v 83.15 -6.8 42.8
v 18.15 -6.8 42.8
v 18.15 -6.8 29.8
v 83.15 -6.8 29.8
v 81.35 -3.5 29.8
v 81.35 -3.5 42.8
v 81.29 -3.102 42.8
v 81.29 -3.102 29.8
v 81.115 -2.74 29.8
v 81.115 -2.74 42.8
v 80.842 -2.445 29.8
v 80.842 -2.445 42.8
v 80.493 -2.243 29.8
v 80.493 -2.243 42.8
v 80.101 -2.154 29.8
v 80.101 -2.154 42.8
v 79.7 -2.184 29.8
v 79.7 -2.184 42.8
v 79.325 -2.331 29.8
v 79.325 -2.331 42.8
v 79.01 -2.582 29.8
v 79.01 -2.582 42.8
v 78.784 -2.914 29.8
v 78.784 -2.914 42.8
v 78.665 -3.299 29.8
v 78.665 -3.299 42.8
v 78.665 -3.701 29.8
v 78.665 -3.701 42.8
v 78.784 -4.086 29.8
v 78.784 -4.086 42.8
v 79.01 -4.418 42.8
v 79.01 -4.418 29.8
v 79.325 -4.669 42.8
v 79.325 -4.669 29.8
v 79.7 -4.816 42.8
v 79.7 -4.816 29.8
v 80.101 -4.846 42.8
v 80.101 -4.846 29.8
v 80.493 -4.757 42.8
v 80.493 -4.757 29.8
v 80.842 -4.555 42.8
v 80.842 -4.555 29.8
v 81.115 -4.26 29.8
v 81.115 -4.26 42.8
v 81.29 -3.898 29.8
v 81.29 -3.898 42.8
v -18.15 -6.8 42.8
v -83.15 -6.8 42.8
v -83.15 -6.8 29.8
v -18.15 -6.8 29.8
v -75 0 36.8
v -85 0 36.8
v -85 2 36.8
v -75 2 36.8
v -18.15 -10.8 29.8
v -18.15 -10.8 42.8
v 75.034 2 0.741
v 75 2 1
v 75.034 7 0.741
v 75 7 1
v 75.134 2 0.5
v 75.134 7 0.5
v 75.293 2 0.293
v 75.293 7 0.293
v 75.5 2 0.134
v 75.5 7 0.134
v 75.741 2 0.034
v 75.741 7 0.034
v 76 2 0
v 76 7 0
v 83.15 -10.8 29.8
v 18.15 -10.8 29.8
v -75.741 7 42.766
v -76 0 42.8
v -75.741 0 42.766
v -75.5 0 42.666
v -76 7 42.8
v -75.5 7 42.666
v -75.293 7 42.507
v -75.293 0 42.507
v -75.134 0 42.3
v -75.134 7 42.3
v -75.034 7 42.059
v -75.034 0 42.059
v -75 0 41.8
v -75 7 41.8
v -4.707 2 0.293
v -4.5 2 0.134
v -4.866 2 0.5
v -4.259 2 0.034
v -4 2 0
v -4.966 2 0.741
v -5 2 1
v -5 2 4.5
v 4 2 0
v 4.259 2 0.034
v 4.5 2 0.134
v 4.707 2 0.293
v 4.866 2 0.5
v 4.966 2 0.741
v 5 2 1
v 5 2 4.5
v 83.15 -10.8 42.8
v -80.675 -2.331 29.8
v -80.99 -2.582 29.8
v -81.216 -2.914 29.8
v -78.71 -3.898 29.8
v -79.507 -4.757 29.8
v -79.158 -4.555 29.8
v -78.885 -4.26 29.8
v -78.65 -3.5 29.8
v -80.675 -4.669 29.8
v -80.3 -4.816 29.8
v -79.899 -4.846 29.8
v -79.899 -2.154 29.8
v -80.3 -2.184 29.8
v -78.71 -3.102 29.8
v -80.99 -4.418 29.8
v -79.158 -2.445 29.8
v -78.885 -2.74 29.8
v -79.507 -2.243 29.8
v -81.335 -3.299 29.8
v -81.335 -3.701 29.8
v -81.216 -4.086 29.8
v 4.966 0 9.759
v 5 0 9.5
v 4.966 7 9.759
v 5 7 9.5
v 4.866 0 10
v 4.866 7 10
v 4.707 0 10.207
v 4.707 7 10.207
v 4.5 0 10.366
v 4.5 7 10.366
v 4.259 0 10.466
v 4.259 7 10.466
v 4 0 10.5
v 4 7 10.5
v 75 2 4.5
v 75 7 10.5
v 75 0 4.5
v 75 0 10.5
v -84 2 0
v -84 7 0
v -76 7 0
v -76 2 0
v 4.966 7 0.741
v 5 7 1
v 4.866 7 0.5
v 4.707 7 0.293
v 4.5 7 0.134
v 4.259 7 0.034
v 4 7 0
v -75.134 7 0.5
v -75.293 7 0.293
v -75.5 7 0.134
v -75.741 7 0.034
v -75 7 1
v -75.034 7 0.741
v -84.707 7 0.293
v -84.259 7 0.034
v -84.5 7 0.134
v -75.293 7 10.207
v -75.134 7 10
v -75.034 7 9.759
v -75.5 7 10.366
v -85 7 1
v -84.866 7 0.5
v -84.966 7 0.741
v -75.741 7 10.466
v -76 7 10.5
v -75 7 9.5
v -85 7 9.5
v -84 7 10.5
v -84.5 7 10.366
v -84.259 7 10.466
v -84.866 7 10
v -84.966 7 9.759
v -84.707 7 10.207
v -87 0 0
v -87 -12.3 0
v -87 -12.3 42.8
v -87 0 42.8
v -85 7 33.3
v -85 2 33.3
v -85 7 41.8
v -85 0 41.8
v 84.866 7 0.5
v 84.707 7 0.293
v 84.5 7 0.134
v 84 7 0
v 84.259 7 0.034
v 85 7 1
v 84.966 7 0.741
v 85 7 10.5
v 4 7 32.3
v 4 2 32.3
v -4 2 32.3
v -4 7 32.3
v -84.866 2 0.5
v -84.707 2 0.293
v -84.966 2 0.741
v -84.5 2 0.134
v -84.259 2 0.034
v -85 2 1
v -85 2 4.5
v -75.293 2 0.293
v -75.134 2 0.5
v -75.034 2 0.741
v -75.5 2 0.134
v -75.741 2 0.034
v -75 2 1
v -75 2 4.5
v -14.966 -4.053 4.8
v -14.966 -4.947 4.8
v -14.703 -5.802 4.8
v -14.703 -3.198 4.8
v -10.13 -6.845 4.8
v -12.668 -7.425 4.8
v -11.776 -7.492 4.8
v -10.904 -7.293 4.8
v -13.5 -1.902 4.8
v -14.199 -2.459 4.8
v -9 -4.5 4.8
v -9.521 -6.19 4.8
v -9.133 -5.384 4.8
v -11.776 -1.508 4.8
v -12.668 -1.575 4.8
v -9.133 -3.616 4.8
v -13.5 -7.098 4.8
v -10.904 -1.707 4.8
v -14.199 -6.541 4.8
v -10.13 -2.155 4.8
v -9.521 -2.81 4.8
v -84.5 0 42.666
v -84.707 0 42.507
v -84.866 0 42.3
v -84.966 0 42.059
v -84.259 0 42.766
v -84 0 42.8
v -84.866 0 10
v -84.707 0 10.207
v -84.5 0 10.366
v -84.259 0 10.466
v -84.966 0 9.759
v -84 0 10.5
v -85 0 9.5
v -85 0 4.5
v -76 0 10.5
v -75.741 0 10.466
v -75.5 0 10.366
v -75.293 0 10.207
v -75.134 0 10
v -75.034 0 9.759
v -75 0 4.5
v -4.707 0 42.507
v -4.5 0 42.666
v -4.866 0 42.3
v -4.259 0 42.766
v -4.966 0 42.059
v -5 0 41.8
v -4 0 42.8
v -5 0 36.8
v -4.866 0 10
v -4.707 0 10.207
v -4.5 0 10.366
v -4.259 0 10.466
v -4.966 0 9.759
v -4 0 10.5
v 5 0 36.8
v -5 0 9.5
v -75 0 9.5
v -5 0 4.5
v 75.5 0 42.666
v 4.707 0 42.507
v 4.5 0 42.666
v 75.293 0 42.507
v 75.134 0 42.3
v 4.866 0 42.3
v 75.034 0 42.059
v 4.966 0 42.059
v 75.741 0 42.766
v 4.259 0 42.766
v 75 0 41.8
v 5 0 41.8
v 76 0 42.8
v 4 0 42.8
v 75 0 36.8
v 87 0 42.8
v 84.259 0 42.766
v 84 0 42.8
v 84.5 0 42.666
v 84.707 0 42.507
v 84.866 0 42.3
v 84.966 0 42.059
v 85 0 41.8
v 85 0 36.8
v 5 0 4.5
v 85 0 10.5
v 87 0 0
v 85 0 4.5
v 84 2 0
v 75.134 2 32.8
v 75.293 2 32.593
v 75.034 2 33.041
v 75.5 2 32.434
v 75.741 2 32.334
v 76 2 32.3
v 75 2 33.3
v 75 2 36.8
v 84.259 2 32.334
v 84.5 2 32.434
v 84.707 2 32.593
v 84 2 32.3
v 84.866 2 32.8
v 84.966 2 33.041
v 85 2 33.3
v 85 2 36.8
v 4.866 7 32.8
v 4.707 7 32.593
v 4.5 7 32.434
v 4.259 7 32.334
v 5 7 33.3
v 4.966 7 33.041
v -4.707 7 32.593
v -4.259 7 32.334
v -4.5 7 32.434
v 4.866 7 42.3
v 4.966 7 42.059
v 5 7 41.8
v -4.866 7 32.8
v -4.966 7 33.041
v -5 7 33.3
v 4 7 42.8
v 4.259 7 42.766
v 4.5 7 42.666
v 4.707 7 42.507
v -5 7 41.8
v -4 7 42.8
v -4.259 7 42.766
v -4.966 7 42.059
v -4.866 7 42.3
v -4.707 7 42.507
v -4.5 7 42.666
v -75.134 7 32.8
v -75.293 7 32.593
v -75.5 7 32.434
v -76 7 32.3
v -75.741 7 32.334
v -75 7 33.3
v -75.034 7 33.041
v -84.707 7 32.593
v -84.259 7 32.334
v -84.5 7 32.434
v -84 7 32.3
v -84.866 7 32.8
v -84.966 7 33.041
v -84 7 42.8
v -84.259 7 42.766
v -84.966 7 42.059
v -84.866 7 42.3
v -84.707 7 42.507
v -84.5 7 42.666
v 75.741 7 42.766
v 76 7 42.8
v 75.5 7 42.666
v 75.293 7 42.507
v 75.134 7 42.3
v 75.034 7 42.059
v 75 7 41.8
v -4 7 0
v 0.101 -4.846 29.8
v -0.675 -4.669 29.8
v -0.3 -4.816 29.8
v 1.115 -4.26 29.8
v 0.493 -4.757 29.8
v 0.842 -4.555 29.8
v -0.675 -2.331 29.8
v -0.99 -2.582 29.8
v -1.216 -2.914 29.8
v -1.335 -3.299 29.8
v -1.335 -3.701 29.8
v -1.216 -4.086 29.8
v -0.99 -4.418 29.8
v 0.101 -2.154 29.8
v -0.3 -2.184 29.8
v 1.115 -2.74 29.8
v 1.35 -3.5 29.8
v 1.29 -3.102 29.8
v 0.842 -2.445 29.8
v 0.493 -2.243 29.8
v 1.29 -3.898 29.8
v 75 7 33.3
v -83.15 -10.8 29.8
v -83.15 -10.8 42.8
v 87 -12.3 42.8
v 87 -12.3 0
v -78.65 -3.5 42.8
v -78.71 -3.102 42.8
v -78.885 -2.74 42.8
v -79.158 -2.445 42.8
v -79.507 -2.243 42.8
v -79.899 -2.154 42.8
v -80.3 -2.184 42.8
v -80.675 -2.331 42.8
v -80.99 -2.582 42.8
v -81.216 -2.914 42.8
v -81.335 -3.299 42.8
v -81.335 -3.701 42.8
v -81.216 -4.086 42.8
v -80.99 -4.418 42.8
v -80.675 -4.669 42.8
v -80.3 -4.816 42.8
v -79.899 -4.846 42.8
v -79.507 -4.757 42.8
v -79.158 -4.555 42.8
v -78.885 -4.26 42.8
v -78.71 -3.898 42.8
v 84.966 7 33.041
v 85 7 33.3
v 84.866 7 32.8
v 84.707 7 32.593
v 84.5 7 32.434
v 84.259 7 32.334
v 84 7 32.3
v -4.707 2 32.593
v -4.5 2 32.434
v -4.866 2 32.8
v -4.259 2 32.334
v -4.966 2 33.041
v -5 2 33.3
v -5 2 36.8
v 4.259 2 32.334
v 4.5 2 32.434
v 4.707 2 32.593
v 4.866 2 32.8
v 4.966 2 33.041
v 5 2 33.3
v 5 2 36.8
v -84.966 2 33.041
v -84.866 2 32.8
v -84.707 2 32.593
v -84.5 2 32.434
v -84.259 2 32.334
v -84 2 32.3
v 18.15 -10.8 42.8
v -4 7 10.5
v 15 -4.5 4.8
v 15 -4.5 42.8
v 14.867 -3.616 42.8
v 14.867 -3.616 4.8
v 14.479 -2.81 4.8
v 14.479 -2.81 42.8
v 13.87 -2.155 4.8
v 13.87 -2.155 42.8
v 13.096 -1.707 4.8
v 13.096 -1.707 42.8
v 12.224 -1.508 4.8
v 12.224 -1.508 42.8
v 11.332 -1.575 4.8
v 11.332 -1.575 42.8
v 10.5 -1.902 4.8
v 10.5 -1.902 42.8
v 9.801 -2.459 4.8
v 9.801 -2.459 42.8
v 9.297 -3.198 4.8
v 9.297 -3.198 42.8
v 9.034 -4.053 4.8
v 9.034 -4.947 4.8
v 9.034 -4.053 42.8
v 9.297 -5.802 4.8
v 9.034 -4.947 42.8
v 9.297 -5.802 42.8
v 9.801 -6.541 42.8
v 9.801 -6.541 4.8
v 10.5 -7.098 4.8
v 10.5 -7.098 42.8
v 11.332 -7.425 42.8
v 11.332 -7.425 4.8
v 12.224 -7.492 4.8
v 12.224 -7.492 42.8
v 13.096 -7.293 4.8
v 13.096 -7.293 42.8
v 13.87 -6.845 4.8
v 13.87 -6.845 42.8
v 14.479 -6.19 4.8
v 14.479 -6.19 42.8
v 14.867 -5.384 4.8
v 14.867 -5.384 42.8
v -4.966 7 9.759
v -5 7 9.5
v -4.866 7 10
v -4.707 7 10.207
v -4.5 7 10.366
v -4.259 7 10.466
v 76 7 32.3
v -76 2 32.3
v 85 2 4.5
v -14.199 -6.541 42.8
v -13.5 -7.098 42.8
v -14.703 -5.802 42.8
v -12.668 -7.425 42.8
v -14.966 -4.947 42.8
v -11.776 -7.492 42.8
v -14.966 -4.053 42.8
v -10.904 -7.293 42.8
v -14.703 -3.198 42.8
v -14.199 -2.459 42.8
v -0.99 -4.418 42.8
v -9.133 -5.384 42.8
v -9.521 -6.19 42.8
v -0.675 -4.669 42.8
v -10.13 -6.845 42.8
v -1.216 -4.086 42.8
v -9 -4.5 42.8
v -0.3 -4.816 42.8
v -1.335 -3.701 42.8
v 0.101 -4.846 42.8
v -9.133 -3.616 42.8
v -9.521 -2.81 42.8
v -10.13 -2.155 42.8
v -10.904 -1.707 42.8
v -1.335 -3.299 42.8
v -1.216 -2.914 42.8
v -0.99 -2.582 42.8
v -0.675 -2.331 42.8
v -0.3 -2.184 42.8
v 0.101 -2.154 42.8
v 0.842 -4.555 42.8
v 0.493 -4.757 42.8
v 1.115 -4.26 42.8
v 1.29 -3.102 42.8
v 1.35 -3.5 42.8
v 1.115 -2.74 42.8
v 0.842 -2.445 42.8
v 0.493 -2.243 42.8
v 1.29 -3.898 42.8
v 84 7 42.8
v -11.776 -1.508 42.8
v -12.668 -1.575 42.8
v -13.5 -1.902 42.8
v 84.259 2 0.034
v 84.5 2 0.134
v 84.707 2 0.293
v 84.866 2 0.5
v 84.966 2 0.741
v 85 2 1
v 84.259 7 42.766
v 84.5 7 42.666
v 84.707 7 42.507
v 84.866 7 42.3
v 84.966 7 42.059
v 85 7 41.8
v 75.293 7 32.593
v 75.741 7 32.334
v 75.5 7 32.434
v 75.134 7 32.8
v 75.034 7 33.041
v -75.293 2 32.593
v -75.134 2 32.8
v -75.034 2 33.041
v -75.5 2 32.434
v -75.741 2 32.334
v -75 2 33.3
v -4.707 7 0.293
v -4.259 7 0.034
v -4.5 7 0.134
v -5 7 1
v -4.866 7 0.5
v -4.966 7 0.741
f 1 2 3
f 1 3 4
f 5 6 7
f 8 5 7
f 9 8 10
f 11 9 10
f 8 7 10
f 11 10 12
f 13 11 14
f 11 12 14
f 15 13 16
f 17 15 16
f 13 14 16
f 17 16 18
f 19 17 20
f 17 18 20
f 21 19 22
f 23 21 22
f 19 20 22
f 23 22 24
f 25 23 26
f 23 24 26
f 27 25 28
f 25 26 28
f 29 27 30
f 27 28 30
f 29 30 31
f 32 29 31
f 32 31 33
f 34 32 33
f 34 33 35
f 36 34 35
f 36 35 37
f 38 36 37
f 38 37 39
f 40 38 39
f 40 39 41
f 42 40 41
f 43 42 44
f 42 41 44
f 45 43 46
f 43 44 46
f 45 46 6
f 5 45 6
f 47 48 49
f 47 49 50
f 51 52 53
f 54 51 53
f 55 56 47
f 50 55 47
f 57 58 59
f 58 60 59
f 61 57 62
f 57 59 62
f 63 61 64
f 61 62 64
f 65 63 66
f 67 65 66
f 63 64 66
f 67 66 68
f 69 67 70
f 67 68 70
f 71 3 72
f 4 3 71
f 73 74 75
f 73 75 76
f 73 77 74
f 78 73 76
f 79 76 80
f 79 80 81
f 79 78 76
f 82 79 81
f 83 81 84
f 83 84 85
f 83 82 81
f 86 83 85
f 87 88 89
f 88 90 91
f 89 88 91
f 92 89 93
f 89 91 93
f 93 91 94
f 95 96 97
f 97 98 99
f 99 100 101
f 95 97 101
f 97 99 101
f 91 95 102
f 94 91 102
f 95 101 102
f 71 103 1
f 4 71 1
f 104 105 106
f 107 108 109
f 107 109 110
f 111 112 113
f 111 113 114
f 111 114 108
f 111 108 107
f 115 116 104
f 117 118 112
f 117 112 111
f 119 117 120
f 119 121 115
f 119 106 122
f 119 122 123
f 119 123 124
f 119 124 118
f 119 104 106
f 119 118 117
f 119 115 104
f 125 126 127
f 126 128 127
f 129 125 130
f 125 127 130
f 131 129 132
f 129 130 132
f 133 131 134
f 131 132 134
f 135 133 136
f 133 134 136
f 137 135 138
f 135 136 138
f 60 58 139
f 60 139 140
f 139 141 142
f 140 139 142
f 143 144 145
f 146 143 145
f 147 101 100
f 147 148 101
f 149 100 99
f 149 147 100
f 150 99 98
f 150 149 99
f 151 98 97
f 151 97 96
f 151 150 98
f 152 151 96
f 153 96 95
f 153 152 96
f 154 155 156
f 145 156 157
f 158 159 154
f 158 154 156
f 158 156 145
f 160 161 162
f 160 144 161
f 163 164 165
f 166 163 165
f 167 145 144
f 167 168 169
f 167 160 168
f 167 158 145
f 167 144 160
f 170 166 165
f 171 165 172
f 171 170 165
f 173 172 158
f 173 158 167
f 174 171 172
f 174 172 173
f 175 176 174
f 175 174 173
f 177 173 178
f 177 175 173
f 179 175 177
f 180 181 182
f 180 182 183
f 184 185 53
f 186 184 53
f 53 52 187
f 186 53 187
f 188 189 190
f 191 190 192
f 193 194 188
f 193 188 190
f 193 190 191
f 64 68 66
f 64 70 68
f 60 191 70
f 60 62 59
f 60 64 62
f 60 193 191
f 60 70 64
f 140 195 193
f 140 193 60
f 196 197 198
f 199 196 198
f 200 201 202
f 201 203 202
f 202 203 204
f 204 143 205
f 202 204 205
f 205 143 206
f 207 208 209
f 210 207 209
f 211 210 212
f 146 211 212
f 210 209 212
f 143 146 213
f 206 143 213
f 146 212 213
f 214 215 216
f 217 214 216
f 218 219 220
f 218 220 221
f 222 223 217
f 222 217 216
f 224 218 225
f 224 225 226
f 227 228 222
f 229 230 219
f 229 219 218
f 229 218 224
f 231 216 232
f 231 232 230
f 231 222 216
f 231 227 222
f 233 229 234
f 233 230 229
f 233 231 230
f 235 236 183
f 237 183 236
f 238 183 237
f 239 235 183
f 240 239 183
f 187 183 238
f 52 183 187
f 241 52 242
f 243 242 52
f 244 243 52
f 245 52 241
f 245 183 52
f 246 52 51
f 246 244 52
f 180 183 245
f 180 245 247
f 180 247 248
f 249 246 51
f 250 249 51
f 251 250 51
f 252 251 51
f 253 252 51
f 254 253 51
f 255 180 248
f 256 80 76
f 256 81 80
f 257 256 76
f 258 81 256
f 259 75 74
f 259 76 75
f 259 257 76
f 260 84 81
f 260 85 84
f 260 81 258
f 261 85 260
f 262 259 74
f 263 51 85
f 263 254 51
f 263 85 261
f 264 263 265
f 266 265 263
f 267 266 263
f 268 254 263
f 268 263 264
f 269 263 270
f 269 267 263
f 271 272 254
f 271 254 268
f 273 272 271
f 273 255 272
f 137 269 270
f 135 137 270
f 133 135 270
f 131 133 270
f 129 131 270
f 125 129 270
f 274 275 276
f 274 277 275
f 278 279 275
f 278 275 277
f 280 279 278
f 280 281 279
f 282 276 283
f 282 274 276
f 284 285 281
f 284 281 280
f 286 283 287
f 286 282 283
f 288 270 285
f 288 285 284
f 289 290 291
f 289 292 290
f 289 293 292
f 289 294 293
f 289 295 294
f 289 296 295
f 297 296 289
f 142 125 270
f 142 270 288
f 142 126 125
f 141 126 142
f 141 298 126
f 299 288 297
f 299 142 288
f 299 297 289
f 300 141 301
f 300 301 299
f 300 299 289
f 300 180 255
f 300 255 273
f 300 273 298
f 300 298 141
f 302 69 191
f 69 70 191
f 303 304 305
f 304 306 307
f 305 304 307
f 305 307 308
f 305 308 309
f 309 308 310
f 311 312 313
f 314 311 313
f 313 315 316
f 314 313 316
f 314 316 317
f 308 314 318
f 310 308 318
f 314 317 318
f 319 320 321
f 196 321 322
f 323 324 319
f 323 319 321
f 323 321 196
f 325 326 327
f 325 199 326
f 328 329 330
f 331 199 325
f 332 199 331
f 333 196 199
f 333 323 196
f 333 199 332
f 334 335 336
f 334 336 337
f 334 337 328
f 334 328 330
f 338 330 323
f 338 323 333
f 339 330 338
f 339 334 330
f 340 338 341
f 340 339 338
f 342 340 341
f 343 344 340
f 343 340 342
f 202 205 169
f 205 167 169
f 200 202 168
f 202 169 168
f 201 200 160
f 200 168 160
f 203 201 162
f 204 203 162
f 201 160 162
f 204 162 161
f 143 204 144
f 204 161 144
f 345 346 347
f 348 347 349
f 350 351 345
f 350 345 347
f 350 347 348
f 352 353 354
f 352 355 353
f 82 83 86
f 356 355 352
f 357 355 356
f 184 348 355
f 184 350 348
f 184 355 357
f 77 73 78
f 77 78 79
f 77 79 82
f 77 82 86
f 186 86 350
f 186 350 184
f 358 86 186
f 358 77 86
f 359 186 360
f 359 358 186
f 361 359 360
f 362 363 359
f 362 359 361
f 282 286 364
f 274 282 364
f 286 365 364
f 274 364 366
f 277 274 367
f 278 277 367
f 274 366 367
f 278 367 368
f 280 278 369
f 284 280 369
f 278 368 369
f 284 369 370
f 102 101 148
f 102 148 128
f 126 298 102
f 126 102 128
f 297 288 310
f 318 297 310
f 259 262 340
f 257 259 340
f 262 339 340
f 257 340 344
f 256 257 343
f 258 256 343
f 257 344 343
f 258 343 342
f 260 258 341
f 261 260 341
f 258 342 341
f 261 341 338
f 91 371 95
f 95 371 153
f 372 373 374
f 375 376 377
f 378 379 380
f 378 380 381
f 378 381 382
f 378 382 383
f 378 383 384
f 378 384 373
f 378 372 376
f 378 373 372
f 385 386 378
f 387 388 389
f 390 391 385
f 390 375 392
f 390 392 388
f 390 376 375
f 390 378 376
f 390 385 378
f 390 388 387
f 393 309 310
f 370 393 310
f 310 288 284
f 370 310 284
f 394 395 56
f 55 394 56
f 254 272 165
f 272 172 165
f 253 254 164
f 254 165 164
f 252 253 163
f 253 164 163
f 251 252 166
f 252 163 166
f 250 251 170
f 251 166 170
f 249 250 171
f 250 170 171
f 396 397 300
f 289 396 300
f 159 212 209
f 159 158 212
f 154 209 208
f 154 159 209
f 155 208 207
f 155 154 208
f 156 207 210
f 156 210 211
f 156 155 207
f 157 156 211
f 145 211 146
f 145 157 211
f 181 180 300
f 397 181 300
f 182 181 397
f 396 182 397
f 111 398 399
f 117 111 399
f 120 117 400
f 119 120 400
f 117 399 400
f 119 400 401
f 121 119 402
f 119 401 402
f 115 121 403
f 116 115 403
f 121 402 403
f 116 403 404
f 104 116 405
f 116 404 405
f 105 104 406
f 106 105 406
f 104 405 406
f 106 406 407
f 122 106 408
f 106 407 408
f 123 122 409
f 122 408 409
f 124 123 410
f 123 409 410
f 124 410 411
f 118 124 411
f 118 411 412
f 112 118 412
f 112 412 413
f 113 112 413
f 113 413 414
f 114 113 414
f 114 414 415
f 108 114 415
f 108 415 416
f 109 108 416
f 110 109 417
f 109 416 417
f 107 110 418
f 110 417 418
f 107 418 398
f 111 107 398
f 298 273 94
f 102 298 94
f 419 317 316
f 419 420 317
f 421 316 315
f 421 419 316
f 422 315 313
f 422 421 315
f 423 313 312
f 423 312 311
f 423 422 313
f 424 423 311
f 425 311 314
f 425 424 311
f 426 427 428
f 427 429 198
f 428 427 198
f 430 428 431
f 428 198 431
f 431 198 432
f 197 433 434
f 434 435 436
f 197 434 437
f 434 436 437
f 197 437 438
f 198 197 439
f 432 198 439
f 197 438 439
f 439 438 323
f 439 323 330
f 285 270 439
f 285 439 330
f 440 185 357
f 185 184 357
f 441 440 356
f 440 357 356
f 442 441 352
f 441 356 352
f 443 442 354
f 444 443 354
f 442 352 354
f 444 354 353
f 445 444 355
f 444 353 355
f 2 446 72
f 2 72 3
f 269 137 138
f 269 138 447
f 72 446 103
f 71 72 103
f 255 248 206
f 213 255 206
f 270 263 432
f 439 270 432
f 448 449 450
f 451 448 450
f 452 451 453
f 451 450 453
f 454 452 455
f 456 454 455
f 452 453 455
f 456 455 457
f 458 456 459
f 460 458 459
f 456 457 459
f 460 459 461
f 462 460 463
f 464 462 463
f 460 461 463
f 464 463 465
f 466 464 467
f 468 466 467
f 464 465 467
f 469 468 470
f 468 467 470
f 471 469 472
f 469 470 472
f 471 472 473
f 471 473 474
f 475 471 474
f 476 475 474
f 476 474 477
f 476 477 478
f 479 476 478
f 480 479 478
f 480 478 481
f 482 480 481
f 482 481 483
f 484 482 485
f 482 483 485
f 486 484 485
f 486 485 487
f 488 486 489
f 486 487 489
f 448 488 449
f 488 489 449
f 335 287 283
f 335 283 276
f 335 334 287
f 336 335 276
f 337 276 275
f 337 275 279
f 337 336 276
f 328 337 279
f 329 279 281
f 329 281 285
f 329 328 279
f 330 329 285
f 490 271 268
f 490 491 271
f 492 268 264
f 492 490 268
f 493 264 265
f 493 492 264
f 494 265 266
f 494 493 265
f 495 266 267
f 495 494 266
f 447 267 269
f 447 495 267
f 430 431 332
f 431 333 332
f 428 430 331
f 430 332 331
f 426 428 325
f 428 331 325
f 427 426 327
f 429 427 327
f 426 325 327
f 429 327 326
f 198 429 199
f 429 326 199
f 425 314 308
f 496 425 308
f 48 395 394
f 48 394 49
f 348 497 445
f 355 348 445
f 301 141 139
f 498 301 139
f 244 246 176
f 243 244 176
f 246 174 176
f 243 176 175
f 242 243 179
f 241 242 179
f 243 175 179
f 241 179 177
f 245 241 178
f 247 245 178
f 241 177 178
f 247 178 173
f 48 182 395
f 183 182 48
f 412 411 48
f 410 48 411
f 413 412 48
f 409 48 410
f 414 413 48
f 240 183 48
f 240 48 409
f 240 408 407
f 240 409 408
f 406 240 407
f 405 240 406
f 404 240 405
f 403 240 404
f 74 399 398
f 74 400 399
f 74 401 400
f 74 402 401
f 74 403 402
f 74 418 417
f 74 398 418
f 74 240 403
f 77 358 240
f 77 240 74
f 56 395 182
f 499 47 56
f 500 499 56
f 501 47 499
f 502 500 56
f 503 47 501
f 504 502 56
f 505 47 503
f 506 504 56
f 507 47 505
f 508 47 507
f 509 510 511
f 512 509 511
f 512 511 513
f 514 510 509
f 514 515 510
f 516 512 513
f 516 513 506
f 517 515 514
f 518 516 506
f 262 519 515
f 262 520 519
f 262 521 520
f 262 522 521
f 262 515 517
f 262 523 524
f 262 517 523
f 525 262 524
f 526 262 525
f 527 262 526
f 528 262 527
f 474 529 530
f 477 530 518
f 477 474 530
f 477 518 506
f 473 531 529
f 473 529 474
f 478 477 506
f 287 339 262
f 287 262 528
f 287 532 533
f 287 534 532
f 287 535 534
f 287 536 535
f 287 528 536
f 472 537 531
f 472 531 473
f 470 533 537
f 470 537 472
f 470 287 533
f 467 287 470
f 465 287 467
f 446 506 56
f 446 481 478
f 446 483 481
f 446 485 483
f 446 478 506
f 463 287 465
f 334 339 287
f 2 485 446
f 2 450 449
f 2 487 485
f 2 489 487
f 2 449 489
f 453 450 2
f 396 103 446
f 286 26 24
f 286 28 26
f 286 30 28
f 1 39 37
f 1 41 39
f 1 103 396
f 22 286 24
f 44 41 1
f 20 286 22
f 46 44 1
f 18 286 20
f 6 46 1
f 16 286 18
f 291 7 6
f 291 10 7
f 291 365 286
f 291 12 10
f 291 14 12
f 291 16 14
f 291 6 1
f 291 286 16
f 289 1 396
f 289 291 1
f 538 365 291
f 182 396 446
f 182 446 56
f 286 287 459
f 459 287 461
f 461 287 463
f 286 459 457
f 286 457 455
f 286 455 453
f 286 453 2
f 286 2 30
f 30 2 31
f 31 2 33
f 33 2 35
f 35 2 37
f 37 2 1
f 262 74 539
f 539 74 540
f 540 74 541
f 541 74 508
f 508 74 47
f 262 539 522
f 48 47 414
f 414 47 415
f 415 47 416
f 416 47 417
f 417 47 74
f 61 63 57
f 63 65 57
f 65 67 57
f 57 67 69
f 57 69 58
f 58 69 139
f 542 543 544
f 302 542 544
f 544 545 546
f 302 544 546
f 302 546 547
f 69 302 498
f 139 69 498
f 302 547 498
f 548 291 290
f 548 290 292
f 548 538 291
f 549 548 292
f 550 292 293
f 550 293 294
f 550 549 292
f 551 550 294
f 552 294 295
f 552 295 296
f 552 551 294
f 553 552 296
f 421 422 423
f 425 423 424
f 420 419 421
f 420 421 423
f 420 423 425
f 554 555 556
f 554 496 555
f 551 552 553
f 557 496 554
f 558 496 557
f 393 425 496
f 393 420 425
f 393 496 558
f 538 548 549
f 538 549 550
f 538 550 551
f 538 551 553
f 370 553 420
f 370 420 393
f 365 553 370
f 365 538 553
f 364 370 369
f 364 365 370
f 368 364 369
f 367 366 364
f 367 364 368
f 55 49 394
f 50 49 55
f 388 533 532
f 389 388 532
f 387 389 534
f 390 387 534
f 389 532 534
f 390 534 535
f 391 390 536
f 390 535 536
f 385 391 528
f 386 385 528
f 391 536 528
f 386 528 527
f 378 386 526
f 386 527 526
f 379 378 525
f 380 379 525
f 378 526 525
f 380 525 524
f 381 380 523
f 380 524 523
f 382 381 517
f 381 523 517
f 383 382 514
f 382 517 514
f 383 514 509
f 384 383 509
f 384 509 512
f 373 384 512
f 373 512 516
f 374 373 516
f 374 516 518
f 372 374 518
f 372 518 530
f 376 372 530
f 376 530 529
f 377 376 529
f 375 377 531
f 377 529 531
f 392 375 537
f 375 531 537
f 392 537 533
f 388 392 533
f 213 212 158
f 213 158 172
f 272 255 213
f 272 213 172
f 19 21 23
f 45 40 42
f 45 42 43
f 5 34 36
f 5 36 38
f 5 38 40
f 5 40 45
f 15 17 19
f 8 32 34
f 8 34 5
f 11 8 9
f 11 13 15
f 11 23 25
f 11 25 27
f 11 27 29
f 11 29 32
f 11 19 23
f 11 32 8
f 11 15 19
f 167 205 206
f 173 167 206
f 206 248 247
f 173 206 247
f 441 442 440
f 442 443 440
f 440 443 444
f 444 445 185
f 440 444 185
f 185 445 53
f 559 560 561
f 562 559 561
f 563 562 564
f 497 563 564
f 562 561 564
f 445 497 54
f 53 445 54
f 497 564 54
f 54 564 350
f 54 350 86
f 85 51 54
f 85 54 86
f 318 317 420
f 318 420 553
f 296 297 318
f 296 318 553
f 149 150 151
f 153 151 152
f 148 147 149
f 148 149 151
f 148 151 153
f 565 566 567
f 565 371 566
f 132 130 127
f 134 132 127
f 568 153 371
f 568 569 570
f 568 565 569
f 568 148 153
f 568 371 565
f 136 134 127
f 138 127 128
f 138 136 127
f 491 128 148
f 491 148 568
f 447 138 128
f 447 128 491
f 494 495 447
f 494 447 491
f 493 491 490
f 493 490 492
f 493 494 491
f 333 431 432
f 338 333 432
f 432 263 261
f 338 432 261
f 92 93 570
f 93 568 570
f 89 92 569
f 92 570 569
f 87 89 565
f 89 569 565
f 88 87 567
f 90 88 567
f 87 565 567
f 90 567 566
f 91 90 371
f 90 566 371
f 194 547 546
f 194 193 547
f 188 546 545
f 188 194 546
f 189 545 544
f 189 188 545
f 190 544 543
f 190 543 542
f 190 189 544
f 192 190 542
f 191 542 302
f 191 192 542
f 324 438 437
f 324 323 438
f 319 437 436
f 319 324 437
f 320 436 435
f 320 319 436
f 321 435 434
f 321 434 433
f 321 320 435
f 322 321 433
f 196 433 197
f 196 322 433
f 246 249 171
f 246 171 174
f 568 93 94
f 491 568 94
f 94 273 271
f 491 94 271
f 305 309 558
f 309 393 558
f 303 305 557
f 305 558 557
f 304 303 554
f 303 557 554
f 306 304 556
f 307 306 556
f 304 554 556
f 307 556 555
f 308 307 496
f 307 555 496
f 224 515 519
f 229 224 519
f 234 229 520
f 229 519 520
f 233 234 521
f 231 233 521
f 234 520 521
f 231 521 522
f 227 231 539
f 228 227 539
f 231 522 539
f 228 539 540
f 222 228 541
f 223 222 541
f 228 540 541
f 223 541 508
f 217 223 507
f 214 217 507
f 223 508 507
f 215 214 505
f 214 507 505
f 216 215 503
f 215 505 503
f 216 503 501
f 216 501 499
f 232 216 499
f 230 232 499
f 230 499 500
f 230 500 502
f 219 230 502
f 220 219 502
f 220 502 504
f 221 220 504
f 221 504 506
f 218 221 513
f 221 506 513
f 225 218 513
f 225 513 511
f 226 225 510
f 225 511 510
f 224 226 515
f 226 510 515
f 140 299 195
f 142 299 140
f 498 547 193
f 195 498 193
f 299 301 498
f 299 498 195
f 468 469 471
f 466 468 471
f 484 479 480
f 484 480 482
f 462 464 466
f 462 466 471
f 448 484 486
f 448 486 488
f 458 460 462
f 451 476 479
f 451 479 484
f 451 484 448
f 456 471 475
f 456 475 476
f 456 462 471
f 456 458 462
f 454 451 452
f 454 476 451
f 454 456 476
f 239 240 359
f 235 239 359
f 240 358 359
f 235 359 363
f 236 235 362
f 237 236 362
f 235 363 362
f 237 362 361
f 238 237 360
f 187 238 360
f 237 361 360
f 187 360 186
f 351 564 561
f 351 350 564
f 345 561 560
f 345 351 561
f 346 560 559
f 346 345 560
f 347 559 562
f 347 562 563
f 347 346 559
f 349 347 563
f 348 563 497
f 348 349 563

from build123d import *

# Parameters (mm, degrees)
F0_W      = 174
F0_H      = 12.3
F1_DEPTH  = 42.8
F2_W      = 10
F2_H      = 10.5
F3_DEPTH  = 7
F4_W      = 2
F4_H      = 4.5
F5_DEPTH  = 172.001
F6_W      = 65
F6_H      = 4
F6_R      = 1.35
F7_DEPTH  = 13
F8_R      = 1
F9_R      = 3
F10_DEPTH = 38


with BuildPart() as f1:
    # F0 (on Top) → F1 (new body)
    with BuildSketch(Plane.XY):
        with Locations((0, -6.15)):
            Rectangle(F0_W, F0_H)
    extrude(amount=F1_DEPTH)

    # F2 (on face) → F3 (join)
    with BuildSketch(Plane(origin=(0, 0, 0), x_dir=(-1, 0, 0), z_dir=(0, 1, 0))):
        with Locations((80, 37.55)):
            Rectangle(F2_W, F2_H)
        with Locations((0, 37.55)):
            Rectangle(F2_W, F2_H)
        with Locations((-80, 37.55)):
            Rectangle(F2_W, F2_H)
        with Locations((80, 5.25)):
            Rectangle(F2_W, F2_H)
        with Locations((0, 5.25)):
            Rectangle(F2_W, F2_H)
        with Locations((-80, 5.25)):
            Rectangle(F2_W, F2_H)
    extrude(amount=F3_DEPTH)

    # F4 (on face) → F5 (cut, through all)
    with BuildSketch(Plane.YZ.offset(85)):
        with Locations((1, 34.55)):
            Rectangle(F4_W, F4_H)
        with Locations((1, 2.25)):
            Rectangle(F4_W, F4_H)
    extrude(amount=-F5_DEPTH, mode=Mode.SUBTRACT)

    # F6 (on face) → F7 (cut)
    with BuildSketch(Plane.XY.offset(42.8)):
        with Locations((-50.65, -8.8)):
            Rectangle(F6_W, F6_H)
        with Locations((50.65, -8.8)):
            Rectangle(F6_W, F6_H)
        with Locations((-80, -3.5)):
            Circle(F6_R)
        with Locations((0, -3.5)):
            Circle(F6_R)
        with Locations((80, -3.5)):
            Circle(F6_R)
    extrude(amount=-F7_DEPTH, mode=Mode.SUBTRACT)

    # F8
    f8_edges = [f1.edges().sort_by_distance(p)[0] for p in [
        (-5, 3.5, 42.8),
        (5, 3.5, 42.8),
        (-75, 3.5, 42.8),
        (-85, 3.5, 42.8),
        (75, 3.5, 42.8),
        (85, 3.5, 42.8),
        (5, 3.5, 10.5),
        (-5, 3.5, 10.5),
        (-75, 3.5, 10.5),
        (-85, 3.5, 10.5),
        (85, 4.5, 32.3),
        (85, 4.5, 0),
        (75, 4.5, 0),
        (5, 4.5, 32.3),
        (5, 4.5, 0),
        (-5, 4.5, 0),
        (-75, 4.5, 32.3),
        (-75, 4.5, 0),
        (-85, 4.5, 0),
        (-85, 4.5, 32.3),
        (-5, 4.5, 32.3),
        (75, 4.5, 32.3),
    ]]
    fillet(f8_edges, radius=F8_R)

    # F9 (on face) → F10 (cut)
    with BuildSketch(Plane.XY.offset(42.8)):
        with Locations((12, -4.5)):
            Circle(F9_R)
        with Locations((-12, -4.5)):
            Circle(F9_R)
    extrude(amount=-F10_DEPTH, mode=Mode.SUBTRACT)


solid = f1.part
